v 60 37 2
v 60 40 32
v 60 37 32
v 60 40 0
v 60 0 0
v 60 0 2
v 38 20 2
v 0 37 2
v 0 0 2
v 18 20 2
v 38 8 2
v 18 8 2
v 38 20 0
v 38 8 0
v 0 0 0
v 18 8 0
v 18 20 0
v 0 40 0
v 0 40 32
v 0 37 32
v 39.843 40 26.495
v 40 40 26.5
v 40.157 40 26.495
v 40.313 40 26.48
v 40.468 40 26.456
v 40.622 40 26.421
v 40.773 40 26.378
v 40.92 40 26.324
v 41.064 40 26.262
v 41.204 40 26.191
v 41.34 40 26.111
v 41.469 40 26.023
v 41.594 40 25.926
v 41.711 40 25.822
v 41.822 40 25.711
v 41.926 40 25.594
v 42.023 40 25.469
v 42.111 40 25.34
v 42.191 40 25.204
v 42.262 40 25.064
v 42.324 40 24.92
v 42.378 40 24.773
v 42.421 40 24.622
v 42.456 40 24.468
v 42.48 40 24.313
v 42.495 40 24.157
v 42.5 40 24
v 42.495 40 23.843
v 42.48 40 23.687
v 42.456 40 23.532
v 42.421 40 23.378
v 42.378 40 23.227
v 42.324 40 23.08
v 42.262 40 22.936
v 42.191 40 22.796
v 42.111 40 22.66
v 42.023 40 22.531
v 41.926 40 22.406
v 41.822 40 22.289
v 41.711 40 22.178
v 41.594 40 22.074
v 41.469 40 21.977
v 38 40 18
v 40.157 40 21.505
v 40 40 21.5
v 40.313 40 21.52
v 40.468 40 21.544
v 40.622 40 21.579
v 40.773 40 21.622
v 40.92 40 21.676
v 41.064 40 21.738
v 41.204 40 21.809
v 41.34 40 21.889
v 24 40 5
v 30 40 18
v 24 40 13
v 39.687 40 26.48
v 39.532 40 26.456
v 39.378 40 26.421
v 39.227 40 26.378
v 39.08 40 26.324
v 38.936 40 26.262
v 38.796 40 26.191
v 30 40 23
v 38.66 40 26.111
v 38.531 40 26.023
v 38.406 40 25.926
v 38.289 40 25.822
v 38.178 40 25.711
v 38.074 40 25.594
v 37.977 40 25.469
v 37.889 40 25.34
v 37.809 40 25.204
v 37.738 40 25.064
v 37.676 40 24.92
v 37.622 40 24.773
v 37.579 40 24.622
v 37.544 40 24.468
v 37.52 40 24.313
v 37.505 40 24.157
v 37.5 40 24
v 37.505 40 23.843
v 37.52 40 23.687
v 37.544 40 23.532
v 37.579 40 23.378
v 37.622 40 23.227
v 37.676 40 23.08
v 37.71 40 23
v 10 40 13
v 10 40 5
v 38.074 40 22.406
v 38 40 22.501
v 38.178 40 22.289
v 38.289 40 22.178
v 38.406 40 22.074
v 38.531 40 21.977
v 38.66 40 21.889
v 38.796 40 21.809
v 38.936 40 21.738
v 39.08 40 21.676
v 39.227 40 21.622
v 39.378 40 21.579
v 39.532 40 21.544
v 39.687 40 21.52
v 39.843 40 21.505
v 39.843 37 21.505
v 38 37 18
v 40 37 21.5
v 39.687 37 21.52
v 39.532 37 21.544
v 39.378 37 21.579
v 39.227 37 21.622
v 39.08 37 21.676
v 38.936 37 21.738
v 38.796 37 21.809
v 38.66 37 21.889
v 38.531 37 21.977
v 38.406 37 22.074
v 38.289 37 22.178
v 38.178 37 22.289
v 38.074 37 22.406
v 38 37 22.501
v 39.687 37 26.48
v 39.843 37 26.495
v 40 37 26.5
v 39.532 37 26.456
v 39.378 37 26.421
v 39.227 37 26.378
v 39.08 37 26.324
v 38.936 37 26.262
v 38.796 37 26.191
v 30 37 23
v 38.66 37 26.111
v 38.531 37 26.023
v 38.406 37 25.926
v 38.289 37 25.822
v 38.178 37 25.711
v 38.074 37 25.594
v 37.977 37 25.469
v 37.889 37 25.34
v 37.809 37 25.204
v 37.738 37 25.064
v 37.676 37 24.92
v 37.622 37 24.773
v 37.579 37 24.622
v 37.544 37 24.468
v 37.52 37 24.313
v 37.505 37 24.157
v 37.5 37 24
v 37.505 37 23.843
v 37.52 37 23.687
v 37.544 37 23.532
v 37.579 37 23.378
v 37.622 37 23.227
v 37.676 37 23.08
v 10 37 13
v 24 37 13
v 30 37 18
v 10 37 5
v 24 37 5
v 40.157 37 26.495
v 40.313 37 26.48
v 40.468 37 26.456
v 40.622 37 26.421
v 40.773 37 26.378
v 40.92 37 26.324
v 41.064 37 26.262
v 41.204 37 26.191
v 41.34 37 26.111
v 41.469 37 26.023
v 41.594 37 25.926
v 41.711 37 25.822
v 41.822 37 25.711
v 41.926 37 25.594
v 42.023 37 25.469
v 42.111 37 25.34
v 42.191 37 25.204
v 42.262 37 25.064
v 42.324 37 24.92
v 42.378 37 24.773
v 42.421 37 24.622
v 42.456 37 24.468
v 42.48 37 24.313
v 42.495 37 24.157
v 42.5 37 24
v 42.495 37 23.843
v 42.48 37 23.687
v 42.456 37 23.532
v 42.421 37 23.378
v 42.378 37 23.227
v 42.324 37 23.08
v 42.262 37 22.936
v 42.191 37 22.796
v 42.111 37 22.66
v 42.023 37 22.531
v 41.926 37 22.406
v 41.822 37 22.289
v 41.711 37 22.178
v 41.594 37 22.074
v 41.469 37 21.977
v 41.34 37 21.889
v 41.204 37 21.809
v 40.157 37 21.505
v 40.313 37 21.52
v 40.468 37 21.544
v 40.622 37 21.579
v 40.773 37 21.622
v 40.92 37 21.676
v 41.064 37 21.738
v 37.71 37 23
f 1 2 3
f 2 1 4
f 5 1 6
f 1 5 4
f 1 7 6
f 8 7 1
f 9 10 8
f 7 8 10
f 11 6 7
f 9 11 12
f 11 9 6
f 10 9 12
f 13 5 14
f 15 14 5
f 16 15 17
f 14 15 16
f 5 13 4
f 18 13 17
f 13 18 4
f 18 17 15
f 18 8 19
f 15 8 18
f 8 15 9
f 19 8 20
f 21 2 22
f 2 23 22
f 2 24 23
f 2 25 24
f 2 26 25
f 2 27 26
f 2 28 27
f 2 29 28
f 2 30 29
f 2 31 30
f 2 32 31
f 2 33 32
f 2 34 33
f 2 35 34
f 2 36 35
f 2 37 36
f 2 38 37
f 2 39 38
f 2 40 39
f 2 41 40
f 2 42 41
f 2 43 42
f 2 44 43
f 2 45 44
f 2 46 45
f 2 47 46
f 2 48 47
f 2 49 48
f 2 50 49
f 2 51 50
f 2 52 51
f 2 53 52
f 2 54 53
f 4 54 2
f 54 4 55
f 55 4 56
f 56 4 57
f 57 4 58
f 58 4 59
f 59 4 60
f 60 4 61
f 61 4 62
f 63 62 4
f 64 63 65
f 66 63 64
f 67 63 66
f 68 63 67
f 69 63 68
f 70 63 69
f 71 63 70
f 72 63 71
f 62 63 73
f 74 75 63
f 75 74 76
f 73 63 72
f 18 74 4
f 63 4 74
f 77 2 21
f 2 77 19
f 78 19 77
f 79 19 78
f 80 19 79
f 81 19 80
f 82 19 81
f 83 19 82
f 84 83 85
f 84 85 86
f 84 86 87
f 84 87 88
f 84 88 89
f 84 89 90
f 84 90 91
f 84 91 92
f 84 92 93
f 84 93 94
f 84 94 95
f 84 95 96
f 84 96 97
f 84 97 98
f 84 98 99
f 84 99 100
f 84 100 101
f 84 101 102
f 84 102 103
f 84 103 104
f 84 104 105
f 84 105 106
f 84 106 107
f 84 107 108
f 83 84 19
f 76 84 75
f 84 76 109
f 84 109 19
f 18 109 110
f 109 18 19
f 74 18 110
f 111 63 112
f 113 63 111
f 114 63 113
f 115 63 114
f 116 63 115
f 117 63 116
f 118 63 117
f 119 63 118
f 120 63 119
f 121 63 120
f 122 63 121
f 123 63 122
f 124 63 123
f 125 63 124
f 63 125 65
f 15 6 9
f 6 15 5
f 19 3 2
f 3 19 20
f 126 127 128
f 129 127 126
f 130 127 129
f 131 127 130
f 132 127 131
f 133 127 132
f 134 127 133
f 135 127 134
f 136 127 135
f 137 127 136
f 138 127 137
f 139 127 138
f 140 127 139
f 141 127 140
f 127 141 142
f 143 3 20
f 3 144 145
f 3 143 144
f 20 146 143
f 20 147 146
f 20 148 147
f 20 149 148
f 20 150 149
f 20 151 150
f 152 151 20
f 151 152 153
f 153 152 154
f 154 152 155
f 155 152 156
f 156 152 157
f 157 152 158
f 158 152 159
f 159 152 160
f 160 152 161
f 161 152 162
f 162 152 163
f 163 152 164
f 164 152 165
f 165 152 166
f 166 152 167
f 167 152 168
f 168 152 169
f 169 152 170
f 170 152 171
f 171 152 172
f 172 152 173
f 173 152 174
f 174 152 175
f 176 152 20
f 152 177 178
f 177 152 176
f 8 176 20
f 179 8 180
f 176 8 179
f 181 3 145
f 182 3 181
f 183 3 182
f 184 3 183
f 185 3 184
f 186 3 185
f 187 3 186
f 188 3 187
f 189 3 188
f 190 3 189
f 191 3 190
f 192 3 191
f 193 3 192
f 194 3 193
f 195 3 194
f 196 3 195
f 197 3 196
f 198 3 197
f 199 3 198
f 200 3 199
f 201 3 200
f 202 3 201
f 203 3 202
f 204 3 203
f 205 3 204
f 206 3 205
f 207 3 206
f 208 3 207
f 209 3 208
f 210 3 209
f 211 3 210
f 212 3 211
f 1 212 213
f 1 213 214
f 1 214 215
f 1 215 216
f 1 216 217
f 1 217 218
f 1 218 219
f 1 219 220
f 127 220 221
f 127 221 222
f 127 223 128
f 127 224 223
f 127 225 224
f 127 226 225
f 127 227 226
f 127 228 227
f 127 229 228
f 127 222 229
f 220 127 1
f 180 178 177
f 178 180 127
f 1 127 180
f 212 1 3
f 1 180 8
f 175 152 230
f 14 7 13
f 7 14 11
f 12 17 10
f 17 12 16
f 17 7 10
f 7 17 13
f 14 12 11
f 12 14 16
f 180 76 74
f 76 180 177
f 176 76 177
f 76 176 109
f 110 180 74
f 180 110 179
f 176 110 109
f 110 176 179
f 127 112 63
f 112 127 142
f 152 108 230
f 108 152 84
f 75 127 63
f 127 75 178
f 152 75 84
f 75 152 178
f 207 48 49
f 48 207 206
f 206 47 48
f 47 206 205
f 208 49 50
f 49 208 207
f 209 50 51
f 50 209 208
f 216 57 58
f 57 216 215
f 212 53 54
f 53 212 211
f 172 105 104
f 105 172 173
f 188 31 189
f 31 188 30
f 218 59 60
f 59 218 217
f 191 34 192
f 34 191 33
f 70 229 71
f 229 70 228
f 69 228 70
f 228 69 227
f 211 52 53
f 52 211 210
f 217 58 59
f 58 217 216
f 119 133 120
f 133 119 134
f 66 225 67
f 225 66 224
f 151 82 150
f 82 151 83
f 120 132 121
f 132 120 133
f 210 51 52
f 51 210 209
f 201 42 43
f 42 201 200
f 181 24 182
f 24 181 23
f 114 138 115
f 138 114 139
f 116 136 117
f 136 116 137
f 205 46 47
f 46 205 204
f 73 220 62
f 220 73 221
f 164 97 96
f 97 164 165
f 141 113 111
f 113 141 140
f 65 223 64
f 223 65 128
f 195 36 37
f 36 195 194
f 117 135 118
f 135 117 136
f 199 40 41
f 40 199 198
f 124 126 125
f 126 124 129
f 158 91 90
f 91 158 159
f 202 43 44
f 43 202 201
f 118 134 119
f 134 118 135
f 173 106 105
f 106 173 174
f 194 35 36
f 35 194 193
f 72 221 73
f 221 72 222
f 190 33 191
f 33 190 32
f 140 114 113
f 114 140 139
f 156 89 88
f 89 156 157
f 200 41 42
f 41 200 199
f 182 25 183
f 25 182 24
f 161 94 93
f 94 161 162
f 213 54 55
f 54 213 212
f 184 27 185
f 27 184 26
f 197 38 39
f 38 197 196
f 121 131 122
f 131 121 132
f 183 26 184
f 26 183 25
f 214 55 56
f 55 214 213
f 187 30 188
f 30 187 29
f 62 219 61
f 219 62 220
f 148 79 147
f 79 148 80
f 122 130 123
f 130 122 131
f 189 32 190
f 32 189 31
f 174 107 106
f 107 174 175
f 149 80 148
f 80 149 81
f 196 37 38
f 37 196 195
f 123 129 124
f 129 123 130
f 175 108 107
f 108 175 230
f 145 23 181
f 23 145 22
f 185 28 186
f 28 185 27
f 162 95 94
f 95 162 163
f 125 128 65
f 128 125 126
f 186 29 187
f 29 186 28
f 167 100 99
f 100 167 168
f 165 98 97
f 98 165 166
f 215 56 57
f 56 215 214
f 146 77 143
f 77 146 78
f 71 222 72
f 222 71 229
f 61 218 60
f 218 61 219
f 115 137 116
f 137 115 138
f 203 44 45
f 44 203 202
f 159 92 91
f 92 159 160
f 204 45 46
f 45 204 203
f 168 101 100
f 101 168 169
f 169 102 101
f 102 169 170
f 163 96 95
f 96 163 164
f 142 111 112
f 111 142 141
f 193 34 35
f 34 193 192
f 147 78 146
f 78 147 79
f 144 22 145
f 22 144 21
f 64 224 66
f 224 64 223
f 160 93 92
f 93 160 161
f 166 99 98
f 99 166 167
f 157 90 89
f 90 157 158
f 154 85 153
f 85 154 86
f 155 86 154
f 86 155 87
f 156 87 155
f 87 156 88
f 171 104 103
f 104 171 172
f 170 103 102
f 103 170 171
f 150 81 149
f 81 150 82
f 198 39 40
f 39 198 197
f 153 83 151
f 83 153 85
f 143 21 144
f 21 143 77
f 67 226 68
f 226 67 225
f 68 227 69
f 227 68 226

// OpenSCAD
// ============================================================
// Parametric model: thin base plate with upright wall and cuts
// ============================================================

// --- Global resolution ---
$fn = 100;

// --- Base plate dimensions ---
plate_length   = 60;      // X extent of the base plate
plate_width    = 40;      // Y extent of the base plate
plate_thickness = 2;      // Z height (very thin)

// --- Wall dimensions ---
wall_height    = 30;       // how tall the wall rises from the plate top
wall_thickness = 3;        // wall depth along Y (narrow strip)
// Wall sits along one full X-edge of the plate, centered on that edge

// --- Floor plate rectangular cut ---
floor_cut_length  = 20;   // X size of the through-cut in the plate
floor_cut_width   = 12;   // Y size of the through-cut in the plate
floor_cut_offset_x = 18;  // X offset from plate origin
floor_cut_offset_y = 8;   // Y offset from plate origin (away from wall edge)

// --- Wall lower rectangular opening (near bottom) ---
wall_low_cut_width  = 14; // X size of the lower wall opening
wall_low_cut_height = 8;  // Z size of the lower wall opening
wall_low_cut_offset_x = 10;// X position along wall
wall_low_cut_z_start = 3; // Z start above plate top face

// --- Wall upper rectangular opening (smaller, higher) ---
wall_high_cut_width  = 8; // X size of the upper wall opening
wall_high_cut_height = 5; // Z size of the upper wall opening
wall_high_cut_offset_x = 30;// X position along wall
wall_high_cut_z_start = 16;// Z start above plate top face

// --- Wall round through-hole ---
hole_diameter   = 5;      // diameter of the round through-hole
hole_offset_x   = 40;     // X position along wall
hole_z_center   = 22;     // Z center above plate top face

// ============================================================
// Derived values (no manual duplication)
// ============================================================
wall_y_pos = plate_width - wall_thickness; // wall sits flush with far Y edge
wall_z_base = plate_thickness;             // wall starts on top of plate

// ============================================================
// Module: base plate (solid slab)
// ============================================================
module base_plate() {
    cube([plate_length, plate_width, plate_thickness]);
}

// ============================================================
// Module: upright wall along one full edge
// ============================================================
module upright_wall() {
    translate([0, wall_y_pos, wall_z_base])
        cube([plate_length, wall_thickness, wall_height]);
}

// ============================================================
// Module: rectangular through-cut in the floor plate
// Goes all the way through the thin sheet
// ============================================================
module floor_cut() {
    translate([floor_cut_offset_x, floor_cut_offset_y, -1])
        cube([floor_cut_length, floor_cut_width, plate_thickness + 2]);
}

// ============================================================
// Module: lower rectangular opening in the wall
// Passes through wall thickness at a lower height band
// ============================================================
module wall_lower_cut() {
    translate([
        wall_low_cut_offset_x,
        wall_y_pos - 1,
        wall_z_base + wall_low_cut_z_start
    ])
        cube([wall_low_cut_width, wall_thickness + 2, wall_low_cut_height]);
}

// ============================================================
// Module: upper rectangular opening in the wall
// Smaller opening at a higher stepped height band
// ============================================================
module wall_upper_cut() {
    translate([
        wall_high_cut_offset_x,
        wall_y_pos - 1,
        wall_z_base + wall_high_cut_z_start
    ])
        cube([wall_high_cut_width, wall_thickness + 2, wall_high_cut_height]);
}

// ============================================================
// Module: round through-hole in the wall
// ============================================================
module wall_round_hole() {
    translate([hole_offset_x, wall_y_pos - 1, wall_z_base + hole_z_center])
        rotate([-90, 0, 0])
            cylinder(d=hole_diameter, h=wall_thickness + 2);
}

// ============================================================
// Assemble the final model using boolean difference
// ============================================================
difference() {
    // Solid body: plate + wall
    union() {
        base_plate();
        upright_wall();
    }

    // Subtract all voids (cuts are through-material, not raised features)
    floor_cut();
    wall_lower_cut();
    wall_upper_cut();
    wall_round_hole();
}
